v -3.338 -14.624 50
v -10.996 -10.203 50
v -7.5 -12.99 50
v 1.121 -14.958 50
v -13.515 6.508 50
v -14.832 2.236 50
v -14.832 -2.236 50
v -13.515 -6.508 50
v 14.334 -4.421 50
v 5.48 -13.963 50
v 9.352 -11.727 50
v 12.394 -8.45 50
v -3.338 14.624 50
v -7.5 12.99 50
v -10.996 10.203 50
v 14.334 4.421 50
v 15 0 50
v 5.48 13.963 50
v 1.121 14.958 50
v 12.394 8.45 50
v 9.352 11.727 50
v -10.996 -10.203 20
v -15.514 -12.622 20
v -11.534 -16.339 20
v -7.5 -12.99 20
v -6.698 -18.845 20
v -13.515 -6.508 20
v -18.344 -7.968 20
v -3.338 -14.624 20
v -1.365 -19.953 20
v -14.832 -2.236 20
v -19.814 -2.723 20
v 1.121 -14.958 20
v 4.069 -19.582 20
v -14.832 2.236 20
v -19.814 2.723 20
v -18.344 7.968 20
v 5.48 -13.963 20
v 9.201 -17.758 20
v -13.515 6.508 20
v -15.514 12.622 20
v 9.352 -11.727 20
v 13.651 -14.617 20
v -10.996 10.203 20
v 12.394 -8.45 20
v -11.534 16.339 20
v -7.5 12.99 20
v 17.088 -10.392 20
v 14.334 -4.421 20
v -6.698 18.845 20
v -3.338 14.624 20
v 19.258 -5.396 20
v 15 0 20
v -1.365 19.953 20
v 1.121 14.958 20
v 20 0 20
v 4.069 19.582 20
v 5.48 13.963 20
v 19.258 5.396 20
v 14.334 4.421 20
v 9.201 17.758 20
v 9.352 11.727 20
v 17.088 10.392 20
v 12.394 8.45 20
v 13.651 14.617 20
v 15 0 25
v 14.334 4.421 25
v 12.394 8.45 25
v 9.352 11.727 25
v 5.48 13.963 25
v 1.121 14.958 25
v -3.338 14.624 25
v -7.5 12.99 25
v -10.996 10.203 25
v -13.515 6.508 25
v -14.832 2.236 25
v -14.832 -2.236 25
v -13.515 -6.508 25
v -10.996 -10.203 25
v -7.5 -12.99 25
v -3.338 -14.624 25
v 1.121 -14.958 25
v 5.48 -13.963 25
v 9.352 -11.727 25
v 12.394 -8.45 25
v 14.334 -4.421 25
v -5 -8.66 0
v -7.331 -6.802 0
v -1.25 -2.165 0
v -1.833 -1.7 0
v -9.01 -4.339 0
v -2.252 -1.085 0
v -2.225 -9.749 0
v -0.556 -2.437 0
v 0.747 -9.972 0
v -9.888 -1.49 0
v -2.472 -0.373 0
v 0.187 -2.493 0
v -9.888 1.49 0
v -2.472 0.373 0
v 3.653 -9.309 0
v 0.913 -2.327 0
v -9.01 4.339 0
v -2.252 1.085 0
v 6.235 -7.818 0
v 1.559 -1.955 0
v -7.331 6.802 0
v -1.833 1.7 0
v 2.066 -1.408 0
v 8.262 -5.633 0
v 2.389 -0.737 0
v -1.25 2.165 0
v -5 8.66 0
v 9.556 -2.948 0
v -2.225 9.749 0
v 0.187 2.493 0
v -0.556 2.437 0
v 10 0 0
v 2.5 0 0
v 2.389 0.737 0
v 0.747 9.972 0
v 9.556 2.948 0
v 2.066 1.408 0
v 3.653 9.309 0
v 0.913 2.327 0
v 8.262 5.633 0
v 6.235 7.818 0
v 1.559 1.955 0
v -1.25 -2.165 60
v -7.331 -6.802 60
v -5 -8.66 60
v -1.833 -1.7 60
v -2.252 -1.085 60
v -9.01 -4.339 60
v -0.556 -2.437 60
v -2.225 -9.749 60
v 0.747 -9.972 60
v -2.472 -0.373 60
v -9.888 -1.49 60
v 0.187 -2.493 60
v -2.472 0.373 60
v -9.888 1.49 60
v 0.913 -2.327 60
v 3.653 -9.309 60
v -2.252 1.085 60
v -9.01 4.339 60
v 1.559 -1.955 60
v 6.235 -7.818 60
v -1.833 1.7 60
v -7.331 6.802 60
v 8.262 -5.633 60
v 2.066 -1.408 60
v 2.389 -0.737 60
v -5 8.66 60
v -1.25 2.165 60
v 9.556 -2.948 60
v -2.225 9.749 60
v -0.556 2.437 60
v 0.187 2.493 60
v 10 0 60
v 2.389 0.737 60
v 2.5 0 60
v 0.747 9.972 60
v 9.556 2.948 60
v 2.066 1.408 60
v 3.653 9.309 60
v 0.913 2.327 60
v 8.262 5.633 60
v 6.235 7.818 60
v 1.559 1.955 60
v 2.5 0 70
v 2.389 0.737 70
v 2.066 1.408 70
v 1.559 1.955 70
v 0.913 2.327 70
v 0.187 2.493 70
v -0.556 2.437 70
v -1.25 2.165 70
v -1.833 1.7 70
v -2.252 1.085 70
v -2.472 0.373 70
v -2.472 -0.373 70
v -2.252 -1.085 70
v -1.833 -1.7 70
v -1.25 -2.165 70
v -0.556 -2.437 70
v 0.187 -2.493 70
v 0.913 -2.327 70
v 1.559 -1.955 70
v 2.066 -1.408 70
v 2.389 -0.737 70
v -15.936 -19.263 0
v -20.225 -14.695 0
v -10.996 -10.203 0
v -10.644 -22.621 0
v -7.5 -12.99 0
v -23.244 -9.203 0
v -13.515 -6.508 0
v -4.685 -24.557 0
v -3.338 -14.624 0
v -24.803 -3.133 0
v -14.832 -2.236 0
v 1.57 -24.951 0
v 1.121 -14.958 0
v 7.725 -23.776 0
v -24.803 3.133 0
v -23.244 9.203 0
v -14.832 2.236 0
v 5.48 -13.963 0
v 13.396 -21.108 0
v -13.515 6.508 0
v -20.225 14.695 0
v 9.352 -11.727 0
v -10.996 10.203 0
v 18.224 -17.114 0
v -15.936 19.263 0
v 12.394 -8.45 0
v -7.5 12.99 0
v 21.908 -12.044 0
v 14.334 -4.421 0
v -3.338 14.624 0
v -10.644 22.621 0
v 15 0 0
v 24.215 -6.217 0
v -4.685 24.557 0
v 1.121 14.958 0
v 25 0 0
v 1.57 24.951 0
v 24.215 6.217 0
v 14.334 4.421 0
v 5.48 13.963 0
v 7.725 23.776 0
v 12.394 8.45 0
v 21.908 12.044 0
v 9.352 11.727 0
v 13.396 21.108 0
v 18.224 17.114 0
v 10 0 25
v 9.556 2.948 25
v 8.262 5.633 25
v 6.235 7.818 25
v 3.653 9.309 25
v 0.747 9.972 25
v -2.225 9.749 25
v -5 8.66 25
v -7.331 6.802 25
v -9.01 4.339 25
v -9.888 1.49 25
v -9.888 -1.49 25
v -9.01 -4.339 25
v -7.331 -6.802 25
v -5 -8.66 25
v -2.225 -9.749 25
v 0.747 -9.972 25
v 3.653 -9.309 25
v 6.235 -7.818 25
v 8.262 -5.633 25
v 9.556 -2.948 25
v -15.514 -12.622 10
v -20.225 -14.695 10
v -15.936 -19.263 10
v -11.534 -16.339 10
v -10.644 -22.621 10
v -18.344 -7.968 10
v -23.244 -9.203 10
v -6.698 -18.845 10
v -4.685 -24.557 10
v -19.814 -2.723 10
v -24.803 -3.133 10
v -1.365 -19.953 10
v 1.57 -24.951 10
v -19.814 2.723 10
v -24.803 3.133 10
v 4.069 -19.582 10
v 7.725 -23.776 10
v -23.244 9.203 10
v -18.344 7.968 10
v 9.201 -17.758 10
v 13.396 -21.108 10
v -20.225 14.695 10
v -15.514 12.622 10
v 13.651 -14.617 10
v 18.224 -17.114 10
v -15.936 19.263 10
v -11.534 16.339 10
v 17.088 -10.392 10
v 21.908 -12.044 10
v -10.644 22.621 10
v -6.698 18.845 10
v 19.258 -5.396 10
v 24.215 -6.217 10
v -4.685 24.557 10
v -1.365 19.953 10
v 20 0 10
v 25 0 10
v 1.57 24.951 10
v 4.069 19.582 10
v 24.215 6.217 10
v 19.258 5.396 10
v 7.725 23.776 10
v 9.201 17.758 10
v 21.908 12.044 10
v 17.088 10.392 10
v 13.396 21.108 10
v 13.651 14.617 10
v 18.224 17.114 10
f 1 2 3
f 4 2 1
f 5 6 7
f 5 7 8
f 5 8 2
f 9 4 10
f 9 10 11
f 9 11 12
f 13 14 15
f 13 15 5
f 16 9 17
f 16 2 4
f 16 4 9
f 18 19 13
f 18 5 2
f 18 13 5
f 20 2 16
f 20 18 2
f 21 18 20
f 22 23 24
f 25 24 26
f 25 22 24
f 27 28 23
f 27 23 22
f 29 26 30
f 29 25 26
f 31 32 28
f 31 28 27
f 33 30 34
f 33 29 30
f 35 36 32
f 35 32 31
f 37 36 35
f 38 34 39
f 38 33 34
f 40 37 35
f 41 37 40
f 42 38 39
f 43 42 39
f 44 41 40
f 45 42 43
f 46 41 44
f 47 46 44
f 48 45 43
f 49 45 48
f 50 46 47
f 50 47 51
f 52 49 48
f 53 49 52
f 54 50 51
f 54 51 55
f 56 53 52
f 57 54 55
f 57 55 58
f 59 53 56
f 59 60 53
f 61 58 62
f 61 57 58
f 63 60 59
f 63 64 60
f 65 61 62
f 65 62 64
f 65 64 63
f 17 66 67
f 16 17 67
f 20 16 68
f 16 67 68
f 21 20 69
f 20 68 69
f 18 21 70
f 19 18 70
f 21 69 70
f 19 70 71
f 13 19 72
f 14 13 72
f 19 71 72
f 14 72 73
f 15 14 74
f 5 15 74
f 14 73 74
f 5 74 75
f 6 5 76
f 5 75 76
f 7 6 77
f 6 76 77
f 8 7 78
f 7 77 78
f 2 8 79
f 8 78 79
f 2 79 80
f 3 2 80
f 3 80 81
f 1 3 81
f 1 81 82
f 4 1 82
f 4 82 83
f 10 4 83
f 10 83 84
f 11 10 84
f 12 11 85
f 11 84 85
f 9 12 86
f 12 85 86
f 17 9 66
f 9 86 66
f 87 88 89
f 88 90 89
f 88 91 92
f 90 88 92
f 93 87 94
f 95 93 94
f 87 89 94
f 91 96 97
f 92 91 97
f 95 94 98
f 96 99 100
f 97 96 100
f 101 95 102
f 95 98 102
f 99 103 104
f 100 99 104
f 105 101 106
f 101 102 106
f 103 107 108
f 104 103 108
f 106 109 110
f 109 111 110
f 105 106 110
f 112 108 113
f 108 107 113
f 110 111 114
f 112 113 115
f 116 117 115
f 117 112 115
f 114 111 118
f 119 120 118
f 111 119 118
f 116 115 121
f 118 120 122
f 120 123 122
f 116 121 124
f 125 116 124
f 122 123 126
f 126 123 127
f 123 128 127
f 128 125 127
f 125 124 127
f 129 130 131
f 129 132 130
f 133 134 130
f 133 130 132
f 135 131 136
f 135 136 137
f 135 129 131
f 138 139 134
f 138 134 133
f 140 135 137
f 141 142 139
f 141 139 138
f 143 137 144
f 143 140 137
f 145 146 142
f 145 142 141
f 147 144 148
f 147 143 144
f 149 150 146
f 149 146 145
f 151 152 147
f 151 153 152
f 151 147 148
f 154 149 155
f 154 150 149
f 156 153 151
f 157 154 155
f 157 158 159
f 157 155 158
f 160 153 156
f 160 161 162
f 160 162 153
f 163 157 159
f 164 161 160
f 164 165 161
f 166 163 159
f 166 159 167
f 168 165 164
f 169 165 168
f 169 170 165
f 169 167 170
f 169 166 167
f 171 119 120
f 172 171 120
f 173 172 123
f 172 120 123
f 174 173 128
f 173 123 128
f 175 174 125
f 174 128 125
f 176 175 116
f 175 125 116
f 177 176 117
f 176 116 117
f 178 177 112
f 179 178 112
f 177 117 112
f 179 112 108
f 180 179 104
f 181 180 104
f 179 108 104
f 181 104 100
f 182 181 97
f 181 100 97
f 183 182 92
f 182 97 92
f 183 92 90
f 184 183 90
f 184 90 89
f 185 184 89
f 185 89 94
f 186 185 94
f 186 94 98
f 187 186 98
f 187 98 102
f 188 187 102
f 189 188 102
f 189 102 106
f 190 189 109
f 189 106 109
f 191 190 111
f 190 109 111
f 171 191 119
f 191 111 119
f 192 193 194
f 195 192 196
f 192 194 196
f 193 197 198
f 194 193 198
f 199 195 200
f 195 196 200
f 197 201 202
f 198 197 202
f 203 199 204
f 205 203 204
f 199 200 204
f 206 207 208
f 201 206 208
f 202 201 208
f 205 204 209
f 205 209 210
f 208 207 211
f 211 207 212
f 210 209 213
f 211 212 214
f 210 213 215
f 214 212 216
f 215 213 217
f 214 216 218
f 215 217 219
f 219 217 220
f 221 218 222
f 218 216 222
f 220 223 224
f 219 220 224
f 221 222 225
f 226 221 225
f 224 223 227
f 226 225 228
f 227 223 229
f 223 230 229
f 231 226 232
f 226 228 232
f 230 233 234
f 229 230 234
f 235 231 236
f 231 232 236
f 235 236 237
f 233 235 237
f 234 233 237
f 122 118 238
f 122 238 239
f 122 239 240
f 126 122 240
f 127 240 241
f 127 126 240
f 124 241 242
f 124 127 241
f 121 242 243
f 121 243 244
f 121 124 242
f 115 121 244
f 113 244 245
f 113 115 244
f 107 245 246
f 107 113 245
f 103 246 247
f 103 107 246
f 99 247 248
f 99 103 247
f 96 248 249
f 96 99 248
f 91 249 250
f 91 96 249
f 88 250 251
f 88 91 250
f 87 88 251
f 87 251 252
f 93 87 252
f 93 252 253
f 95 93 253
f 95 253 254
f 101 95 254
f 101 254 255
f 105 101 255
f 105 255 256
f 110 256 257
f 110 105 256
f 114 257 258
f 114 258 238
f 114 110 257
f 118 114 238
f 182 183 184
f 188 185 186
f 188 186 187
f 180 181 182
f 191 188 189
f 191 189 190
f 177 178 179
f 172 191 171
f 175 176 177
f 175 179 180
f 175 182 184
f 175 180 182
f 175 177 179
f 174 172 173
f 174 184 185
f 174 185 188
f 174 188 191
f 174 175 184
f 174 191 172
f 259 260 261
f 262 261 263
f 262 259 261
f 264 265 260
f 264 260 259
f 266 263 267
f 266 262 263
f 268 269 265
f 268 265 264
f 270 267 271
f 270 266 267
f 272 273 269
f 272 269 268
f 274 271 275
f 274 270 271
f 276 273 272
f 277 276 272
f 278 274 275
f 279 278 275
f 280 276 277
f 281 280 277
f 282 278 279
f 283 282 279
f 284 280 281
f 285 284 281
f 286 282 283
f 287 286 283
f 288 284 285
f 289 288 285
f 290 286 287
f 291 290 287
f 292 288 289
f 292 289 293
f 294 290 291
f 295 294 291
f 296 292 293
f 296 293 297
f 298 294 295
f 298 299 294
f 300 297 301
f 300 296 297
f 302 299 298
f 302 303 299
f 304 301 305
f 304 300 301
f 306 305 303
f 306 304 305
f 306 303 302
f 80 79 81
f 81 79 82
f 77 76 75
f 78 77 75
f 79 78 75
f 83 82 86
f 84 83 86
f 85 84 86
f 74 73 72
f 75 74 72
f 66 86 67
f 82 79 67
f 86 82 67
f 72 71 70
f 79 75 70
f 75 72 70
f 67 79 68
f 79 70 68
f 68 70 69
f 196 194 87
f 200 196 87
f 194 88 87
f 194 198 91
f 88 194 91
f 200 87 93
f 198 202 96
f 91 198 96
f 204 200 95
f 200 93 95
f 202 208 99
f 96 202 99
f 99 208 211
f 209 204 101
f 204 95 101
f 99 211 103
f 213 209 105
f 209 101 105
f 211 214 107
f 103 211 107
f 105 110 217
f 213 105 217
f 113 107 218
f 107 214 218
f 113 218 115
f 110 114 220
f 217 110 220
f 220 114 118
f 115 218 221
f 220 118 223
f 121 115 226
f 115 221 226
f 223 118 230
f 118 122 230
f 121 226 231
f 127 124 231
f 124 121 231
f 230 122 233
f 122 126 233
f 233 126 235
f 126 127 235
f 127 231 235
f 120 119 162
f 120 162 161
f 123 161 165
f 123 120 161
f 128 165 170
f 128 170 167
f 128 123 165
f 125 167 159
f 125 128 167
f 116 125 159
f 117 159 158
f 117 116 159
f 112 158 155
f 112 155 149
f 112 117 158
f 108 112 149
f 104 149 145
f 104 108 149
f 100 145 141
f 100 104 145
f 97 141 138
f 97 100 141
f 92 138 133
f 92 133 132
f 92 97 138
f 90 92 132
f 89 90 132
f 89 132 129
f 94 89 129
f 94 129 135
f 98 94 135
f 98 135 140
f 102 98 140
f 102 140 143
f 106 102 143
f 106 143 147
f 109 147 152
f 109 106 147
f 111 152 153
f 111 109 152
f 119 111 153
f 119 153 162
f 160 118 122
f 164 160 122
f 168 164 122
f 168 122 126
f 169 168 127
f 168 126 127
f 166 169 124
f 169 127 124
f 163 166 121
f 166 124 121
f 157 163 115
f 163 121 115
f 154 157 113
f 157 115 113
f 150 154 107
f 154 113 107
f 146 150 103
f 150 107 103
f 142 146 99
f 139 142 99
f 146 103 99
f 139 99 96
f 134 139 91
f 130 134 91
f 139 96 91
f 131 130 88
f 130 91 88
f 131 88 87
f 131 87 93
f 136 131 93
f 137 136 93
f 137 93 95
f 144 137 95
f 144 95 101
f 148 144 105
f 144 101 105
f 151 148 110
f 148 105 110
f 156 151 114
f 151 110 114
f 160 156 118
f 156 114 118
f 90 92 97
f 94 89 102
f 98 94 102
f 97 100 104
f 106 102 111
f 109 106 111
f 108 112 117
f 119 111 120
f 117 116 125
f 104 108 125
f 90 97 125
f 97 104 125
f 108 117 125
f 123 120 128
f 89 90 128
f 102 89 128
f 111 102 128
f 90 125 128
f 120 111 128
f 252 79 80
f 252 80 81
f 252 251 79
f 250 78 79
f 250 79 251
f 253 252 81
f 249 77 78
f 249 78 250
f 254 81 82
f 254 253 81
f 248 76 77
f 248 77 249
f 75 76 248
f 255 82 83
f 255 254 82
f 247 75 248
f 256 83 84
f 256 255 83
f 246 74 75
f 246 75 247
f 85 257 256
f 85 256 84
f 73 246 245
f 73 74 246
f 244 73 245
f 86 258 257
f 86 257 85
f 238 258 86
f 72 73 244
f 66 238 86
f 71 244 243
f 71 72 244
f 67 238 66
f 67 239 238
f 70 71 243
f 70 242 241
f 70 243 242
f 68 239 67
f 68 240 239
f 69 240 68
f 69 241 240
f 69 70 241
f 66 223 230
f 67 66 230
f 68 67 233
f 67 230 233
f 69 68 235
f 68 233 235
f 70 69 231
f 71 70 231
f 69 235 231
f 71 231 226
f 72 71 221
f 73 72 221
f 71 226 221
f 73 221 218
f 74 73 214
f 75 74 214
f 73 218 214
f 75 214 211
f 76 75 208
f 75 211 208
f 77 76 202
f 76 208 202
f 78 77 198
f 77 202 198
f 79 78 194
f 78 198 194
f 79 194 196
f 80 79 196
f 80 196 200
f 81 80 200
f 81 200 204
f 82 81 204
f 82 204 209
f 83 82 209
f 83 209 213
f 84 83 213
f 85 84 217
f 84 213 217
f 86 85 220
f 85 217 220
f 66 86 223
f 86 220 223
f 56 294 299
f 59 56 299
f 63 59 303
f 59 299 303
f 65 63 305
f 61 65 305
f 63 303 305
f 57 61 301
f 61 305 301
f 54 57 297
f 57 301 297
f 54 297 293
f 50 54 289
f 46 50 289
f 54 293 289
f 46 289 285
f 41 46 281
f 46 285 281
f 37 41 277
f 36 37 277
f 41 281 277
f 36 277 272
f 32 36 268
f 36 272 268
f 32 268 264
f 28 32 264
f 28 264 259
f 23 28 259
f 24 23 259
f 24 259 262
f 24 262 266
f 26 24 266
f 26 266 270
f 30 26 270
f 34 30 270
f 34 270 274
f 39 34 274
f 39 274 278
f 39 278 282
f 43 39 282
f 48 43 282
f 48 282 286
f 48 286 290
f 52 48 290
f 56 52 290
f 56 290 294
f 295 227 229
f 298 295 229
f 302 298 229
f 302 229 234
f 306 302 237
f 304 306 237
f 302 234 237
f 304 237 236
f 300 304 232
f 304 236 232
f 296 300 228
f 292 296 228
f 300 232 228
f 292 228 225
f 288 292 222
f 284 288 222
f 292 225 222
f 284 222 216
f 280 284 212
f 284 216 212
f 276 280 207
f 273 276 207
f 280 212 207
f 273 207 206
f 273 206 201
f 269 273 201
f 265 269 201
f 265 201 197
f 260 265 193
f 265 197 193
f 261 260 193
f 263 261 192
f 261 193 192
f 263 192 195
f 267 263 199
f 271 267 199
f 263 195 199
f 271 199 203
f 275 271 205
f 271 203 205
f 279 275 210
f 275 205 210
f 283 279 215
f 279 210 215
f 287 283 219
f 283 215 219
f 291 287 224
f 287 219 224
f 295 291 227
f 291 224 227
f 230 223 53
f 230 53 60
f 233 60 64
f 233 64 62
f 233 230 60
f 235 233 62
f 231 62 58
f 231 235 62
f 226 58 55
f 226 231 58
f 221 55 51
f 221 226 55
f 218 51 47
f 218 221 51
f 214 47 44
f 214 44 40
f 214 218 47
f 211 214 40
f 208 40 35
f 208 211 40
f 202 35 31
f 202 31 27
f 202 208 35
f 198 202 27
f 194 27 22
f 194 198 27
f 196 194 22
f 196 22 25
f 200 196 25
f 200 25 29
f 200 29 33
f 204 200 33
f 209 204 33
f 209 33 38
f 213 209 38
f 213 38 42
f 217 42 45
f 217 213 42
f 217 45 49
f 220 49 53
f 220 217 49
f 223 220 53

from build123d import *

# Parameters (mm, degrees)
F0_R     = 2.5
F1_DEPTH = 70
F0_R_2   = 25
F0_R_3   = 20
F2_DEPTH = 10
F0_R_4   = 15
F3_DEPTH = 20
F0_R_5   = 10
F4_DEPTH = 25
F6_R     = 15
F7_DEPTH = 25
F8_DEPTH = 60


with BuildPart() as f1:
    # F0 (on Top) → F1 (new body)
    with BuildSketch(Plane.XY):
        Circle(F0_R)
    extrude(amount=F1_DEPTH)


with BuildPart() as f2:
    # F0 (on Top) → F2 (new body)
    with BuildSketch(Plane.XY):
        Circle(F0_R_2)
        Circle(F0_R_3, mode=Mode.SUBTRACT)
    extrude(amount=F2_DEPTH)

    # F0 (on Top) → F3 (join)
    with BuildSketch(Plane.XY):
        Circle(F0_R_3)
        Circle(F0_R_4, mode=Mode.SUBTRACT)
    extrude(amount=F3_DEPTH)


with BuildPart() as f4:
    # F0 (on Top) → F4 (new body)
    with BuildSketch(Plane.XY):
        Circle(F0_R_4)
        Circle(F0_R_5, mode=Mode.SUBTRACT)
    extrude(amount=F4_DEPTH)


with BuildPart() as f7:
    # F6 (on offset) → F7 (new body)
    with BuildSketch(Plane.XY.offset(25)):
        Circle(F6_R)
    extrude(amount=F7_DEPTH)


with BuildPart() as f8:
    # F0 (on Top) → F8 (new body)
    with BuildSketch(Plane.XY):
        Circle(F0_R_5)
        Circle(F0_R, mode=Mode.SUBTRACT)
    extrude(amount=F8_DEPTH)


solid = Compound([f1.part, f2.part, f4.part, f7.part, f8.part])
